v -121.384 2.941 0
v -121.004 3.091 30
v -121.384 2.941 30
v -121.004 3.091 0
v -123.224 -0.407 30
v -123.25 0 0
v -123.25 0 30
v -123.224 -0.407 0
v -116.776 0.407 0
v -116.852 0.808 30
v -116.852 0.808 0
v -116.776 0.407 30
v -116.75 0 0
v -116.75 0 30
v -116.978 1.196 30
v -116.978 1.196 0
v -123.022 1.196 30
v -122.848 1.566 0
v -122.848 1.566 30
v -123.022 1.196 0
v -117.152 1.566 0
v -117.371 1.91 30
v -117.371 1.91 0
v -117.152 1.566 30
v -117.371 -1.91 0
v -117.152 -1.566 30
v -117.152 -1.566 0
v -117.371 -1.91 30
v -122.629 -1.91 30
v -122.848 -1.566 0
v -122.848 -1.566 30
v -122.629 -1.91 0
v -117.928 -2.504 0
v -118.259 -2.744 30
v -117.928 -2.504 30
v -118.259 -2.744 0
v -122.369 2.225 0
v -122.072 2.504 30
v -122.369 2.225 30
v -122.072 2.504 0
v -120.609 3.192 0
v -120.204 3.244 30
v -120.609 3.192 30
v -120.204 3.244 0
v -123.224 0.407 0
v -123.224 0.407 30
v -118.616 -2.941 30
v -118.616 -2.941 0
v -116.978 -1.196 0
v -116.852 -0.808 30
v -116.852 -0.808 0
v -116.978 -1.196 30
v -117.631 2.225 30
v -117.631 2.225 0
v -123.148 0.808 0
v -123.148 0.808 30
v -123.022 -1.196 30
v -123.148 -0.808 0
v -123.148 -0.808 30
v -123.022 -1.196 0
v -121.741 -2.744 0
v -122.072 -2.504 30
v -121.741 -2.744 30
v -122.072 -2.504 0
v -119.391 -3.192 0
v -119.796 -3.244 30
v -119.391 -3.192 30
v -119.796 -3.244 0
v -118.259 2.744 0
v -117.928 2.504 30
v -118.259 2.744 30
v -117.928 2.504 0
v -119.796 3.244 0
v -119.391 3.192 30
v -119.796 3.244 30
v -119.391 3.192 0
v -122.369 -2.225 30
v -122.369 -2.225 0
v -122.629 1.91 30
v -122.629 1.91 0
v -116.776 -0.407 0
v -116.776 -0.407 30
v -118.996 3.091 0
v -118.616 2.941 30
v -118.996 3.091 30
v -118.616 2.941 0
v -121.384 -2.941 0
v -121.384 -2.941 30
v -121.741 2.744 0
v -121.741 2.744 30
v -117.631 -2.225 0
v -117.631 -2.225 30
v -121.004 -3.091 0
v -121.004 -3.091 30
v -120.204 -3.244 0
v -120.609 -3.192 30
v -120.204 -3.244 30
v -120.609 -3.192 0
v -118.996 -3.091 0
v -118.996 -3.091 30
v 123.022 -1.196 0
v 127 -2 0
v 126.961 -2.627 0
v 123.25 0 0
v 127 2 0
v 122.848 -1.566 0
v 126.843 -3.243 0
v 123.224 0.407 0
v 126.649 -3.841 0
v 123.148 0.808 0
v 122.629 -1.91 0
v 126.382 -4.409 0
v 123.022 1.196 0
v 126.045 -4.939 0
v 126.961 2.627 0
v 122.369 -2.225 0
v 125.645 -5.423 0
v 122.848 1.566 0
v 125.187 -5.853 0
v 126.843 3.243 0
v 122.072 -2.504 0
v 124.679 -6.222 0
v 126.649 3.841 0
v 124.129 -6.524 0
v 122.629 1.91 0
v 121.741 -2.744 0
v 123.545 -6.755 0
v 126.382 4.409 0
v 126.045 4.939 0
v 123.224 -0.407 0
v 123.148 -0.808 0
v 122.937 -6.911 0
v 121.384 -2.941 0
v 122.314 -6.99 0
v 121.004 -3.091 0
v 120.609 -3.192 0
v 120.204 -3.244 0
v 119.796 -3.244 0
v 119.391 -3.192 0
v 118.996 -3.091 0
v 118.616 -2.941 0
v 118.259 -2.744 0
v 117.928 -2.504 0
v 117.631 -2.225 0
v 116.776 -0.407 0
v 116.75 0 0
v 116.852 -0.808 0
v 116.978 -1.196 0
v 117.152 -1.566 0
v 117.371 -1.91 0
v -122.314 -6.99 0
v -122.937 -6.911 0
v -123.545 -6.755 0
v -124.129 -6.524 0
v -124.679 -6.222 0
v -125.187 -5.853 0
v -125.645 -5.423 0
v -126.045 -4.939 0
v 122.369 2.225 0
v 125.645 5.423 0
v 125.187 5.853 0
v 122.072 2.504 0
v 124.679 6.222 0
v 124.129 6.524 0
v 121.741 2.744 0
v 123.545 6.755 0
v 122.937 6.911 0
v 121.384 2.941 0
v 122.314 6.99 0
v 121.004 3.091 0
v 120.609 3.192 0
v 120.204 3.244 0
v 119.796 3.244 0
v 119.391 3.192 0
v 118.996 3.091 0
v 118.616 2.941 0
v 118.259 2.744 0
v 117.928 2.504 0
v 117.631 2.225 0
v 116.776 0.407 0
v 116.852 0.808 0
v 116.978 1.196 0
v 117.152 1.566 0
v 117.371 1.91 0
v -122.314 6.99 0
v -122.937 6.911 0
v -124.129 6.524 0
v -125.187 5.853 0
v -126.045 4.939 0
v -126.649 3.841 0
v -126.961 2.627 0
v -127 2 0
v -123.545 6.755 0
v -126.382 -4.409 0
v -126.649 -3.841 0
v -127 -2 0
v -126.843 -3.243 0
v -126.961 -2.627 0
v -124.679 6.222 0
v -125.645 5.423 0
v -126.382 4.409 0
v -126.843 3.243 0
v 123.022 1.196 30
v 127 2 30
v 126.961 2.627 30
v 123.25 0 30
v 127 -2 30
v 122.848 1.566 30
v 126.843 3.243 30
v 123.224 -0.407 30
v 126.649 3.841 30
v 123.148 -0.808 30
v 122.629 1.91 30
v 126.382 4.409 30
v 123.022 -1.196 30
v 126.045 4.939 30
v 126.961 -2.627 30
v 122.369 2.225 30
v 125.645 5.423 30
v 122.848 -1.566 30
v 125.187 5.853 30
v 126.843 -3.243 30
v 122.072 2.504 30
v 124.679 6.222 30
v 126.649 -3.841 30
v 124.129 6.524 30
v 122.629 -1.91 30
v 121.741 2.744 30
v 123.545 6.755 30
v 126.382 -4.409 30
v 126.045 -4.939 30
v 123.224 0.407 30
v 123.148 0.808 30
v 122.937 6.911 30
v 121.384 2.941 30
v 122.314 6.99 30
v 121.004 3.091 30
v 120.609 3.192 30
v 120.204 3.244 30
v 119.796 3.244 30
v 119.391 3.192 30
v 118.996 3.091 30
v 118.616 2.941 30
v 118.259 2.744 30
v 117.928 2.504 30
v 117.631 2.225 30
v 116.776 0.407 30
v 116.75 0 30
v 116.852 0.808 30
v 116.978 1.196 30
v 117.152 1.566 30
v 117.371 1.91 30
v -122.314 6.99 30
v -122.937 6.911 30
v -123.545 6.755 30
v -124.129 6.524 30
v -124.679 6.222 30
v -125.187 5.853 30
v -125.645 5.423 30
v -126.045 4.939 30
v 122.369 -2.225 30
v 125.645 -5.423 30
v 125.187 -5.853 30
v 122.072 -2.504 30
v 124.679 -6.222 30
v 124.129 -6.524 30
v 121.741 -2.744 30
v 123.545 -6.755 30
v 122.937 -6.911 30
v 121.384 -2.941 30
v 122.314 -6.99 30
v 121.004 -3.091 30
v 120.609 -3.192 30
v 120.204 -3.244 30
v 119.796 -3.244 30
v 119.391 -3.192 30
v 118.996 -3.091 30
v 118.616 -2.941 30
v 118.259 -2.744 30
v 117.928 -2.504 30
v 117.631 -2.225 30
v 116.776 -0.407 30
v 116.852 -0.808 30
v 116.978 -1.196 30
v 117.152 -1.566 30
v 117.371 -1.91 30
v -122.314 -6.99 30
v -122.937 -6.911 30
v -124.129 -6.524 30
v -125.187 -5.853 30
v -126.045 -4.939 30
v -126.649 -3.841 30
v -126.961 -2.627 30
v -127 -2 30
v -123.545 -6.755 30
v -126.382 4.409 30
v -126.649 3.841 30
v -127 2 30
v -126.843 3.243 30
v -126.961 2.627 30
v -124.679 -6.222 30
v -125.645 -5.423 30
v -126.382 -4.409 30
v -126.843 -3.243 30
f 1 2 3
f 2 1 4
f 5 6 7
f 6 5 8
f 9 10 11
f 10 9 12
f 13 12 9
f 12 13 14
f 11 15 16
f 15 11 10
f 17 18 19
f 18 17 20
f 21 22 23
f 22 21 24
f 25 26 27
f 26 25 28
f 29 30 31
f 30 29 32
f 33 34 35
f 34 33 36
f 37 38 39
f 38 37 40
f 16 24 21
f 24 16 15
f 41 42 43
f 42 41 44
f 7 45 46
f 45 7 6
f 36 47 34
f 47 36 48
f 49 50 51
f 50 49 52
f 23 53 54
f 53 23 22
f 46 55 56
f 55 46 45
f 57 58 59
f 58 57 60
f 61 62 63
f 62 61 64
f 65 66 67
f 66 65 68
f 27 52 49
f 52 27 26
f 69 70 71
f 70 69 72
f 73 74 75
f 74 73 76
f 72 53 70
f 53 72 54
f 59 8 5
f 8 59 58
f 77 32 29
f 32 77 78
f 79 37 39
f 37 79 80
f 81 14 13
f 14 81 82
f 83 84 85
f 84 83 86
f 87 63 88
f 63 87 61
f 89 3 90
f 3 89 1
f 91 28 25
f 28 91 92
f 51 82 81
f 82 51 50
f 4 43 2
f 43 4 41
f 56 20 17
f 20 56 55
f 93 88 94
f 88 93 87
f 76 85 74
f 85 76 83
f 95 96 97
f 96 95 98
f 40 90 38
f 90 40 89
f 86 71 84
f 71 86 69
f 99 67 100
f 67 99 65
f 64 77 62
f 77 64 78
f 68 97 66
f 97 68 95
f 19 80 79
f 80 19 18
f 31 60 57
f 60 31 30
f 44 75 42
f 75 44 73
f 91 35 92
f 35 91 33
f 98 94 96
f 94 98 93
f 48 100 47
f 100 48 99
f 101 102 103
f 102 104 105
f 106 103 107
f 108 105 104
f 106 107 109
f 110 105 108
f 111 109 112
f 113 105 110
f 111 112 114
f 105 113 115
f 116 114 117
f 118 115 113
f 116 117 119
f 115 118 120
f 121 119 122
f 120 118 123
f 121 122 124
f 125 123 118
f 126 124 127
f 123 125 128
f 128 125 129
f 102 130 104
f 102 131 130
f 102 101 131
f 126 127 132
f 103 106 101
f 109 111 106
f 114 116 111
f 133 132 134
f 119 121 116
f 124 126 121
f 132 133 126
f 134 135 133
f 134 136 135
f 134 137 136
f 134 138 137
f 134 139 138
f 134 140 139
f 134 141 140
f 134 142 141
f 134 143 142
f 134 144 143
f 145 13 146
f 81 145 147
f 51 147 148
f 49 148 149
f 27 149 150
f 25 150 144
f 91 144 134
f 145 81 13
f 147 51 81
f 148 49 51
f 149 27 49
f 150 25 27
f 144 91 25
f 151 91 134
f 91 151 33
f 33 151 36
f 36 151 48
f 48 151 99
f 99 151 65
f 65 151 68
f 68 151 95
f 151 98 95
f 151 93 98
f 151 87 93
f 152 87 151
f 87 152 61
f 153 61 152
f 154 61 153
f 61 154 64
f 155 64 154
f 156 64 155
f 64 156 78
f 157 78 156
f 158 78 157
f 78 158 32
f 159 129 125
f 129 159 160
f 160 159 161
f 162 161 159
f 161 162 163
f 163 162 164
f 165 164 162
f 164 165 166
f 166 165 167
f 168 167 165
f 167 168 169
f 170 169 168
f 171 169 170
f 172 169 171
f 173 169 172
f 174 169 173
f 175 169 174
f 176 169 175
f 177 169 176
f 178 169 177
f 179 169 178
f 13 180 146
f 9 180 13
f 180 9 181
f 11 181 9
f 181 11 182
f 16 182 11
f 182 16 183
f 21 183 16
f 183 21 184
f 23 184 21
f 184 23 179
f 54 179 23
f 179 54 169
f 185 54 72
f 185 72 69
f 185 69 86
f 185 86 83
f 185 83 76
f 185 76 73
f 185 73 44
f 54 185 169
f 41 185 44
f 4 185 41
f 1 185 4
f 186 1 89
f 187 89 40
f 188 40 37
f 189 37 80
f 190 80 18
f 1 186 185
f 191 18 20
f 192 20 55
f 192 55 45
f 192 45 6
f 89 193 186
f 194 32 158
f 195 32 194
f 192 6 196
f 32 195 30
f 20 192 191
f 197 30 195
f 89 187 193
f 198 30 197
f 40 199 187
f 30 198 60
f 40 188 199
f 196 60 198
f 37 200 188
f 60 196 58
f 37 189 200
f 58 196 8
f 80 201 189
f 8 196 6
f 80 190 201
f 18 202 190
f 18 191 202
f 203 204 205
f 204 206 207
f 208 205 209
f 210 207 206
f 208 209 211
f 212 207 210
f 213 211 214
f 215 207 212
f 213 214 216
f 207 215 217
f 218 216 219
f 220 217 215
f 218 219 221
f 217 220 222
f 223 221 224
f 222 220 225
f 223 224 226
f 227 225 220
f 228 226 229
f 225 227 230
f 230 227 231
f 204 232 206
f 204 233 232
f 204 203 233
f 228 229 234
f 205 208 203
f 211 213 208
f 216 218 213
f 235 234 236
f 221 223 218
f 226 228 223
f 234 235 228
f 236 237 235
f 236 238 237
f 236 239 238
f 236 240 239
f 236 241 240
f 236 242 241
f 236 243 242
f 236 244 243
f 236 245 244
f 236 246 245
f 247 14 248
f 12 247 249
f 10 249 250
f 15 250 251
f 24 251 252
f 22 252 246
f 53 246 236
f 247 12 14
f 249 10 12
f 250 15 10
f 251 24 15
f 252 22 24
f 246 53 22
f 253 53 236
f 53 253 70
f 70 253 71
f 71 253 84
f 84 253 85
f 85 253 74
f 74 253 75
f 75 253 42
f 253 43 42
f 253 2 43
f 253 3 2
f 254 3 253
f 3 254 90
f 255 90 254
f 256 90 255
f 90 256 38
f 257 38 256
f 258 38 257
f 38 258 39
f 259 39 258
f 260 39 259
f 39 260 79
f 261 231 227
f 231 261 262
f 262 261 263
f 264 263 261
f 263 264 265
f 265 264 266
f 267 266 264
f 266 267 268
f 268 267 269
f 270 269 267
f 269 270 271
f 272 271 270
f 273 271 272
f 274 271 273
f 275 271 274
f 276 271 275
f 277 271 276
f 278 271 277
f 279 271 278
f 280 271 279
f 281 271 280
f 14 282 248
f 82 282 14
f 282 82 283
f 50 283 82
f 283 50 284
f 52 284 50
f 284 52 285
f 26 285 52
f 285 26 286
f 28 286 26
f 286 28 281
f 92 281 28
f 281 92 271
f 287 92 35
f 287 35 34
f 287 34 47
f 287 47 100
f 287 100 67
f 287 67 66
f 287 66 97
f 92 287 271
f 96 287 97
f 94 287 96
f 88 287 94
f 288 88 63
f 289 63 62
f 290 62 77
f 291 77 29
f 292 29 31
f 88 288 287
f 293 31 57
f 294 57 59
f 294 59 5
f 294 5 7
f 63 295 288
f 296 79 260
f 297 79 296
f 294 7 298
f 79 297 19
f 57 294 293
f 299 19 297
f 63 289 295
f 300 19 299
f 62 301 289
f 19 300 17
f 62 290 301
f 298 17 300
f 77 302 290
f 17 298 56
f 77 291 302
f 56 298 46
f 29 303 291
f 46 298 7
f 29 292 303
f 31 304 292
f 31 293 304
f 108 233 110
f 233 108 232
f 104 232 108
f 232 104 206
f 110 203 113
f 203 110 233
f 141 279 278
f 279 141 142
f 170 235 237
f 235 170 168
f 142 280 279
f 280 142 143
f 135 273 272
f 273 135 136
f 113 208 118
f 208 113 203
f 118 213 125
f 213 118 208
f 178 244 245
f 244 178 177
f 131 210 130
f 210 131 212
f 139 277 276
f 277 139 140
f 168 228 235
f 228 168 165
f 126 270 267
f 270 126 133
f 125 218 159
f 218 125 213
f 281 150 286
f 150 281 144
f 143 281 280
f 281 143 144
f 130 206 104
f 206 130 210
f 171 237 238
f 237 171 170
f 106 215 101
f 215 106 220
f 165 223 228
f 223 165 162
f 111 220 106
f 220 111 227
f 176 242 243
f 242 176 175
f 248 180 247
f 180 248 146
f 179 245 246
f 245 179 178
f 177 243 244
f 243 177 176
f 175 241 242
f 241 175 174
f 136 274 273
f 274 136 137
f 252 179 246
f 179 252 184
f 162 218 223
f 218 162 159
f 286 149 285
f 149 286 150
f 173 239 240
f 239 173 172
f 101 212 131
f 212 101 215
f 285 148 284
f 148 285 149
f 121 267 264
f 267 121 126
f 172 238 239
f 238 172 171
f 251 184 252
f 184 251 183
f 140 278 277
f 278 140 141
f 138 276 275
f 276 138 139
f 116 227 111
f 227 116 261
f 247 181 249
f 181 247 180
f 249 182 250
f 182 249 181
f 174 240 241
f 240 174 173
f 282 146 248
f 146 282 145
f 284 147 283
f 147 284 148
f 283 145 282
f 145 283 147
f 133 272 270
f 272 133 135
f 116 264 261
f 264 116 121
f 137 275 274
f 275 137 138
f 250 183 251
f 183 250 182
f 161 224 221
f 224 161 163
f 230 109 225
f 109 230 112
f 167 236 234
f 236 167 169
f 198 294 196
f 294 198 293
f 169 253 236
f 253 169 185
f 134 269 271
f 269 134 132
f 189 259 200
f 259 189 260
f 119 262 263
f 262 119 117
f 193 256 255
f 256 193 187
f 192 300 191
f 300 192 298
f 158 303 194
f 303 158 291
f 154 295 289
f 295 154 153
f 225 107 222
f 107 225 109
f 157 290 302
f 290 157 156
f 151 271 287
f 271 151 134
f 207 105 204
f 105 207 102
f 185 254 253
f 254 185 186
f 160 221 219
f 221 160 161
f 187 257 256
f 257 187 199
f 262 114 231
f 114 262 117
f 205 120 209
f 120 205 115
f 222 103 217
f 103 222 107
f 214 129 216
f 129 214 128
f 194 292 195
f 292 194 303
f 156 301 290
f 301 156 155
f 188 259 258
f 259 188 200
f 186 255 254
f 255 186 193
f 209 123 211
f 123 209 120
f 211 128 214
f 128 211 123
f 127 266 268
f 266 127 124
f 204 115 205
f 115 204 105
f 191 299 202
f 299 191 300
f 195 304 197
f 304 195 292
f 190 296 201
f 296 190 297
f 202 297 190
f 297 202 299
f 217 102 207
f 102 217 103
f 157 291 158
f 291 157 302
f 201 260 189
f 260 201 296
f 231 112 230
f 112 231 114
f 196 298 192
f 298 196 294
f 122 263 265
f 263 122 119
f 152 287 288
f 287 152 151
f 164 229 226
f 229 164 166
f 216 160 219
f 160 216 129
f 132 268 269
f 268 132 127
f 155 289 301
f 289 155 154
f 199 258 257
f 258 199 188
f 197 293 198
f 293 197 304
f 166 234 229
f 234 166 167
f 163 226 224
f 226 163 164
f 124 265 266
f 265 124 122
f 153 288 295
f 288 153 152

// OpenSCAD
$fn = 50;


difference() {
	union() {
		hull() {
			translate(v = [-122.0000000000, 2.0000000000, 0]) {
				cylinder(h = 30, r = 5);
			}
			translate(v = [122.0000000000, 2.0000000000, 0]) {
				cylinder(h = 30, r = 5);
			}
			translate(v = [-122.0000000000, -2.0000000000, 0]) {
				cylinder(h = 30, r = 5);
			}
			translate(v = [122.0000000000, -2.0000000000, 0]) {
				cylinder(h = 30, r = 5);
			}
		}
	}
	union() {
		translate(v = [-120.0000000000, 0.0000000000, 0]) {
			cylinder(h = 30, r = 3.2500000000);
		}
		translate(v = [120.0000000000, 0.0000000000, 0]) {
			cylinder(h = 30, r = 3.2500000000);
		}
		translate(v = [-120.0000000000, 0.0000000000, 0]) {
			cylinder(h = 30, r = 1.8000000000);
		}
		translate(v = [120.0000000000, 0.0000000000, 0]) {
			cylinder(h = 30, r = 1.8000000000);
		}
		translate(v = [-120.0000000000, 0.0000000000, 0]) {
			cylinder(h = 30, r = 1.8000000000);
		}
		translate(v = [120.0000000000, 0.0000000000, 0]) {
			cylinder(h = 30, r = 1.8000000000);
		}
		translate(v = [-120.0000000000, 0.0000000000, 0]) {
			cylinder(h = 30, r = 1.8000000000);
		}
		translate(v = [120.0000000000, 0.0000000000, 0]) {
			cylinder(h = 30, r = 1.8000000000);
		}
	}
}
